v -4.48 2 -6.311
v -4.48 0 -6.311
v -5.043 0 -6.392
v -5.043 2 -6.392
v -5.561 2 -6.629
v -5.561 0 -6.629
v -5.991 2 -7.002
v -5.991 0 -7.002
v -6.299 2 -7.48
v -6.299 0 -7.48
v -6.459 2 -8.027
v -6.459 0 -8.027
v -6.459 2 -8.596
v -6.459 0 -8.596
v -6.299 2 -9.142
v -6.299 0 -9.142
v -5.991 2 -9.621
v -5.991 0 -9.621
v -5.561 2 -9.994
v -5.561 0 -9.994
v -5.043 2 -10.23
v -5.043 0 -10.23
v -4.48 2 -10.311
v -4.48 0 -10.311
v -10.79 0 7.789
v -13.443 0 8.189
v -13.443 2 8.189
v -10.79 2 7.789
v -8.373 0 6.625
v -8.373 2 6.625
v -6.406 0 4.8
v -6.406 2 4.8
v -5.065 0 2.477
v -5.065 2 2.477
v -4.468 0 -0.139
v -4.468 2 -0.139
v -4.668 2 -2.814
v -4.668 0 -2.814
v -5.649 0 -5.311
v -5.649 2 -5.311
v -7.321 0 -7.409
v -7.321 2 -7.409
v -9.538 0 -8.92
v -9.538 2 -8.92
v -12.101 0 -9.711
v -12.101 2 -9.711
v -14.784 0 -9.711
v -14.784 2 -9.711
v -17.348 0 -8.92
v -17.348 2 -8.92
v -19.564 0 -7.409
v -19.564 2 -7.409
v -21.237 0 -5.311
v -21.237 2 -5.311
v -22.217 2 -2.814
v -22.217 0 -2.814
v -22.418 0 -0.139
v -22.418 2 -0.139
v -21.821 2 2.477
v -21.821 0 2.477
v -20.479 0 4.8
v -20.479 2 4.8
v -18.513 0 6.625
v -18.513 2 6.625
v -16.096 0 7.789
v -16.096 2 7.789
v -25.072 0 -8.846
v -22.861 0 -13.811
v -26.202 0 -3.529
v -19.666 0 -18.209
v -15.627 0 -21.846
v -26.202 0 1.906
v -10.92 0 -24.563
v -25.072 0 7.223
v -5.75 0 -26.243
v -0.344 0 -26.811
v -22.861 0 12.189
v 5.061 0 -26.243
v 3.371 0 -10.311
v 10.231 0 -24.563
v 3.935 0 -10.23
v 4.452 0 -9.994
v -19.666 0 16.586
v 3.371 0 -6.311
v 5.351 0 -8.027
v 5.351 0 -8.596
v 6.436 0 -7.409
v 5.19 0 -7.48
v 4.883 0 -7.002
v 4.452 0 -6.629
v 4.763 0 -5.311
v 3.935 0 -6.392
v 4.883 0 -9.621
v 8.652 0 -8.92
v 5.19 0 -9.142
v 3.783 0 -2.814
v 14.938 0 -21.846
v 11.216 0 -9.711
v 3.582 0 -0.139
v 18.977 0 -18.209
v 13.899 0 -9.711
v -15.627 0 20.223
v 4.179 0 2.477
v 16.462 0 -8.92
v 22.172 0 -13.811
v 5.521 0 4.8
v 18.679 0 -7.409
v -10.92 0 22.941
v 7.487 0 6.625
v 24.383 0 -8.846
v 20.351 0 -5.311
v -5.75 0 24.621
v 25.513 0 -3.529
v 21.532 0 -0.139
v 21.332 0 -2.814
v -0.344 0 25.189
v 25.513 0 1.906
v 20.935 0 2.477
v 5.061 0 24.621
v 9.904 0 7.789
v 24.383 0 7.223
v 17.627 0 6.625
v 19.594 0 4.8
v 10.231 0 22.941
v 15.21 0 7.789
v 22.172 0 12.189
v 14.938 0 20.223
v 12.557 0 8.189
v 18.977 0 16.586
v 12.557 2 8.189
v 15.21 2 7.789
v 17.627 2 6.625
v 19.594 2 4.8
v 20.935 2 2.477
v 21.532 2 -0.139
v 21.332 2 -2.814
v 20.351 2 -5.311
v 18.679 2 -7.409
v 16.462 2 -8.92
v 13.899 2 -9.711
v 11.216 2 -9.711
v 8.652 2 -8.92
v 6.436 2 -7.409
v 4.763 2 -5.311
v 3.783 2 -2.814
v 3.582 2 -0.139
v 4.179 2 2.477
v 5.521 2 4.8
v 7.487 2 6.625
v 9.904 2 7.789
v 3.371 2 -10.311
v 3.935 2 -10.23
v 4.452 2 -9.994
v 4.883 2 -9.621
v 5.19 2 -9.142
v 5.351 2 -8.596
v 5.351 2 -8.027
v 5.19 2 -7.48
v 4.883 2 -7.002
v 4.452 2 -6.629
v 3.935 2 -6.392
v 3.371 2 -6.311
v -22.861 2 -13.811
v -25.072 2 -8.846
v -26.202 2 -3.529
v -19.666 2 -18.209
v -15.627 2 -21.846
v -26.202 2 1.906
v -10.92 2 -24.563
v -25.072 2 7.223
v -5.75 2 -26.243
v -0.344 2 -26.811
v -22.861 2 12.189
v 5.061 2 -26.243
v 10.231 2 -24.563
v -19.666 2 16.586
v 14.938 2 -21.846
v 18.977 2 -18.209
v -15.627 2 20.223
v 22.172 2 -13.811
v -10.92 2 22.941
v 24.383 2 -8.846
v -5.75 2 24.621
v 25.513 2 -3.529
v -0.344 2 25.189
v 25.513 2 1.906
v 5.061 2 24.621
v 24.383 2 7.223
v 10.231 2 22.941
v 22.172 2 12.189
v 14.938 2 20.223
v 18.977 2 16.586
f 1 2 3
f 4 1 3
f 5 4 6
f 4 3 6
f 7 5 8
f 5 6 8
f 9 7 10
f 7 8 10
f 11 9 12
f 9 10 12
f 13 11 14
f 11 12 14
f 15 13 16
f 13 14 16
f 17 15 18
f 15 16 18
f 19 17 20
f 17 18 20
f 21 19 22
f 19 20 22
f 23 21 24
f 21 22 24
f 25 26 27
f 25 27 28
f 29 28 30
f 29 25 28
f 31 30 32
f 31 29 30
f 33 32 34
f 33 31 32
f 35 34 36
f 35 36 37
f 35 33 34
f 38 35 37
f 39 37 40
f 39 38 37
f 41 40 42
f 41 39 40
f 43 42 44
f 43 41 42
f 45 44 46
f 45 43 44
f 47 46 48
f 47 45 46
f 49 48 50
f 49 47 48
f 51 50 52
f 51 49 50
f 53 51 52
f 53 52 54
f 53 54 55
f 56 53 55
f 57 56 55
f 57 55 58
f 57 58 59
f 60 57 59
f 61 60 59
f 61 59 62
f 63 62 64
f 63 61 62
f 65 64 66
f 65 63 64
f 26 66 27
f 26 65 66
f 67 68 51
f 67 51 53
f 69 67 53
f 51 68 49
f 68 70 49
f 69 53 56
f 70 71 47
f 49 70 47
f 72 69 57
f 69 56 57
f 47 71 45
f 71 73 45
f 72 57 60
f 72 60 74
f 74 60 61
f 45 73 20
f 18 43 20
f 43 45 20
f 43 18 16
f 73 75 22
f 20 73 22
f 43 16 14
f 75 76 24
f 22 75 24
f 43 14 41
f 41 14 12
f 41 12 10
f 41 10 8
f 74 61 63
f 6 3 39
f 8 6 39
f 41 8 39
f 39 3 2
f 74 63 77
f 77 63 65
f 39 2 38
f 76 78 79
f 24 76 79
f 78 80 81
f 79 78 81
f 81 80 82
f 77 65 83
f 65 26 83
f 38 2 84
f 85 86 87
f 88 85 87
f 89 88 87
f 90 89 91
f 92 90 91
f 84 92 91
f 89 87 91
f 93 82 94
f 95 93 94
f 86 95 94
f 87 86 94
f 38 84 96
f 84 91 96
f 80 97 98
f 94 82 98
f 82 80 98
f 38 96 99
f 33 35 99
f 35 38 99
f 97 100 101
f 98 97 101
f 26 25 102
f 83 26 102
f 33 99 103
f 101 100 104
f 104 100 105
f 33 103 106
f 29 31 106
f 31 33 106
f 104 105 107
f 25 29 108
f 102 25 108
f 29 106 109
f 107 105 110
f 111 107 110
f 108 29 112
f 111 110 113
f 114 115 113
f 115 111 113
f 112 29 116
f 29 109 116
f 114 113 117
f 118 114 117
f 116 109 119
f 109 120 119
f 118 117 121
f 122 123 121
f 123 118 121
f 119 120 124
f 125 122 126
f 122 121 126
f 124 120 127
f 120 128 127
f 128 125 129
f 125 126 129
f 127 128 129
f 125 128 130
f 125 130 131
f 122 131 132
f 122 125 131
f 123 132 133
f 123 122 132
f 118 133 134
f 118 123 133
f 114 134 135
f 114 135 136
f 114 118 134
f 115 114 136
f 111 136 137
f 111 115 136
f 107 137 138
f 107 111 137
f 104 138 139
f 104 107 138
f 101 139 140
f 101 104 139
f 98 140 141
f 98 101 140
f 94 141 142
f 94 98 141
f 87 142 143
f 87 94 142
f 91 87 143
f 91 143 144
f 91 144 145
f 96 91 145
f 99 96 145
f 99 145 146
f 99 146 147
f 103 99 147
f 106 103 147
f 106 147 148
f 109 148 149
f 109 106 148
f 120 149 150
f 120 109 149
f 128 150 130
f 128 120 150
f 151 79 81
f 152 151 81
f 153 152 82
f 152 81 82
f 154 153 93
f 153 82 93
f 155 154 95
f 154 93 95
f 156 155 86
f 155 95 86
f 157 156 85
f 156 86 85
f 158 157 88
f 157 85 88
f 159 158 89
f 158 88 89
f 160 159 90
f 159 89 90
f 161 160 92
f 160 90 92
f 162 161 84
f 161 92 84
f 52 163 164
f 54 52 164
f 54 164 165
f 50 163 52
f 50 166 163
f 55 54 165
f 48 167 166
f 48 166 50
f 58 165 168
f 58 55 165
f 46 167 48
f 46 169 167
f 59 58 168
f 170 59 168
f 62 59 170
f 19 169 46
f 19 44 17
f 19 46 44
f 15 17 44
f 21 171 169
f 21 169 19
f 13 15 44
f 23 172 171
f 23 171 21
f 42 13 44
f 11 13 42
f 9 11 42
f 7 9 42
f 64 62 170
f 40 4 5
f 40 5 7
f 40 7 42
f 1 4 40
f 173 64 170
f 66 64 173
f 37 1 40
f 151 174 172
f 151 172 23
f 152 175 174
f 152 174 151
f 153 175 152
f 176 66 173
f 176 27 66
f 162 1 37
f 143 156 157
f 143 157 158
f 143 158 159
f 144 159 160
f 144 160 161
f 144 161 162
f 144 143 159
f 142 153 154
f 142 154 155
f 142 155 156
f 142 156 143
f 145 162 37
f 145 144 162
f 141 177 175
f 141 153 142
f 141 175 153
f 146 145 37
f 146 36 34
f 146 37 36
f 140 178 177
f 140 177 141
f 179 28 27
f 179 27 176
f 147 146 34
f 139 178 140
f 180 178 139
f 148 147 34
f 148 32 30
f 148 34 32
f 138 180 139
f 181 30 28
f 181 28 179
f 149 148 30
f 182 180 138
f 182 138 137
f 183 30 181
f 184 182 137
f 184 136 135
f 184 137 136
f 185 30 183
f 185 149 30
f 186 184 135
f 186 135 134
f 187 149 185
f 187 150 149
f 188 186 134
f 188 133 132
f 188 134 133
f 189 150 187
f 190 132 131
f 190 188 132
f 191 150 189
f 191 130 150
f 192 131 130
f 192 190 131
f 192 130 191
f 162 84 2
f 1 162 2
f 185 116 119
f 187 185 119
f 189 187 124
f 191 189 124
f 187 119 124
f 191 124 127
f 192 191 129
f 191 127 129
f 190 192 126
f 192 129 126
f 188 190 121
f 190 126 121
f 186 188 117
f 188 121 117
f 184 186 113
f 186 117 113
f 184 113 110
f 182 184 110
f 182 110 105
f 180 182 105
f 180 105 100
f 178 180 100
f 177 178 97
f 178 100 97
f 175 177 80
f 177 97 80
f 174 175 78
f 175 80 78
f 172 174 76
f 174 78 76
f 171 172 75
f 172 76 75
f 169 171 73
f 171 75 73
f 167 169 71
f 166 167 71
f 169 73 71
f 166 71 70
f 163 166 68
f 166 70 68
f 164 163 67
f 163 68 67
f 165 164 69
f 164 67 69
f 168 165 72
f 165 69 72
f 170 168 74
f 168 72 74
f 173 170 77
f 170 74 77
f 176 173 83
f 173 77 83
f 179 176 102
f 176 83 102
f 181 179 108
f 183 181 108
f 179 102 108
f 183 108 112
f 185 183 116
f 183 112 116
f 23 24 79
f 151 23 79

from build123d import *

# Parameters (mm, degrees)
SKETCH1_R           = 26
SKETCH1_R_2         = 9
BOSS_EXTRUDE1_DEPTH = 2


with BuildPart() as part:
    # Sketch1 → Boss-Extrude1 (new body)
    with BuildSketch(Plane(origin=(0, 0, 0), x_dir=(1, 0, 0), z_dir=(0, 1, 0))):
        with Locations(Location((-0.344405321, 0.81125846, 0), (0, 0, 270))):
            Circle(SKETCH1_R)
        with Locations(Location((12.557190609, 0.81125846, 0), (0, 0, 270))):
            Circle(SKETCH1_R_2, mode=Mode.SUBTRACT)
        with Locations(Location((-13.442809391, 0.81125846, 0), (0, 0, 270))):
            Circle(SKETCH1_R_2, mode=Mode.SUBTRACT)
        with BuildLine():
            Line((-4.479671933, 10.31125846), (3.371060839, 10.31125846))
            ThreePointArc((3.371060839, 10.31125846), (5.371060839, 8.31125846), (3.371060839, 6.31125846))
            Line((3.371060839, 6.31125846), (-4.479671933, 6.31125846))
            ThreePointArc((-4.479671933, 6.31125846), (-6.479671933, 8.31125846), (-4.479671933, 10.31125846))
        make_face(mode=Mode.SUBTRACT)
    extrude(amount=BOSS_EXTRUDE1_DEPTH)


solid = part.part
